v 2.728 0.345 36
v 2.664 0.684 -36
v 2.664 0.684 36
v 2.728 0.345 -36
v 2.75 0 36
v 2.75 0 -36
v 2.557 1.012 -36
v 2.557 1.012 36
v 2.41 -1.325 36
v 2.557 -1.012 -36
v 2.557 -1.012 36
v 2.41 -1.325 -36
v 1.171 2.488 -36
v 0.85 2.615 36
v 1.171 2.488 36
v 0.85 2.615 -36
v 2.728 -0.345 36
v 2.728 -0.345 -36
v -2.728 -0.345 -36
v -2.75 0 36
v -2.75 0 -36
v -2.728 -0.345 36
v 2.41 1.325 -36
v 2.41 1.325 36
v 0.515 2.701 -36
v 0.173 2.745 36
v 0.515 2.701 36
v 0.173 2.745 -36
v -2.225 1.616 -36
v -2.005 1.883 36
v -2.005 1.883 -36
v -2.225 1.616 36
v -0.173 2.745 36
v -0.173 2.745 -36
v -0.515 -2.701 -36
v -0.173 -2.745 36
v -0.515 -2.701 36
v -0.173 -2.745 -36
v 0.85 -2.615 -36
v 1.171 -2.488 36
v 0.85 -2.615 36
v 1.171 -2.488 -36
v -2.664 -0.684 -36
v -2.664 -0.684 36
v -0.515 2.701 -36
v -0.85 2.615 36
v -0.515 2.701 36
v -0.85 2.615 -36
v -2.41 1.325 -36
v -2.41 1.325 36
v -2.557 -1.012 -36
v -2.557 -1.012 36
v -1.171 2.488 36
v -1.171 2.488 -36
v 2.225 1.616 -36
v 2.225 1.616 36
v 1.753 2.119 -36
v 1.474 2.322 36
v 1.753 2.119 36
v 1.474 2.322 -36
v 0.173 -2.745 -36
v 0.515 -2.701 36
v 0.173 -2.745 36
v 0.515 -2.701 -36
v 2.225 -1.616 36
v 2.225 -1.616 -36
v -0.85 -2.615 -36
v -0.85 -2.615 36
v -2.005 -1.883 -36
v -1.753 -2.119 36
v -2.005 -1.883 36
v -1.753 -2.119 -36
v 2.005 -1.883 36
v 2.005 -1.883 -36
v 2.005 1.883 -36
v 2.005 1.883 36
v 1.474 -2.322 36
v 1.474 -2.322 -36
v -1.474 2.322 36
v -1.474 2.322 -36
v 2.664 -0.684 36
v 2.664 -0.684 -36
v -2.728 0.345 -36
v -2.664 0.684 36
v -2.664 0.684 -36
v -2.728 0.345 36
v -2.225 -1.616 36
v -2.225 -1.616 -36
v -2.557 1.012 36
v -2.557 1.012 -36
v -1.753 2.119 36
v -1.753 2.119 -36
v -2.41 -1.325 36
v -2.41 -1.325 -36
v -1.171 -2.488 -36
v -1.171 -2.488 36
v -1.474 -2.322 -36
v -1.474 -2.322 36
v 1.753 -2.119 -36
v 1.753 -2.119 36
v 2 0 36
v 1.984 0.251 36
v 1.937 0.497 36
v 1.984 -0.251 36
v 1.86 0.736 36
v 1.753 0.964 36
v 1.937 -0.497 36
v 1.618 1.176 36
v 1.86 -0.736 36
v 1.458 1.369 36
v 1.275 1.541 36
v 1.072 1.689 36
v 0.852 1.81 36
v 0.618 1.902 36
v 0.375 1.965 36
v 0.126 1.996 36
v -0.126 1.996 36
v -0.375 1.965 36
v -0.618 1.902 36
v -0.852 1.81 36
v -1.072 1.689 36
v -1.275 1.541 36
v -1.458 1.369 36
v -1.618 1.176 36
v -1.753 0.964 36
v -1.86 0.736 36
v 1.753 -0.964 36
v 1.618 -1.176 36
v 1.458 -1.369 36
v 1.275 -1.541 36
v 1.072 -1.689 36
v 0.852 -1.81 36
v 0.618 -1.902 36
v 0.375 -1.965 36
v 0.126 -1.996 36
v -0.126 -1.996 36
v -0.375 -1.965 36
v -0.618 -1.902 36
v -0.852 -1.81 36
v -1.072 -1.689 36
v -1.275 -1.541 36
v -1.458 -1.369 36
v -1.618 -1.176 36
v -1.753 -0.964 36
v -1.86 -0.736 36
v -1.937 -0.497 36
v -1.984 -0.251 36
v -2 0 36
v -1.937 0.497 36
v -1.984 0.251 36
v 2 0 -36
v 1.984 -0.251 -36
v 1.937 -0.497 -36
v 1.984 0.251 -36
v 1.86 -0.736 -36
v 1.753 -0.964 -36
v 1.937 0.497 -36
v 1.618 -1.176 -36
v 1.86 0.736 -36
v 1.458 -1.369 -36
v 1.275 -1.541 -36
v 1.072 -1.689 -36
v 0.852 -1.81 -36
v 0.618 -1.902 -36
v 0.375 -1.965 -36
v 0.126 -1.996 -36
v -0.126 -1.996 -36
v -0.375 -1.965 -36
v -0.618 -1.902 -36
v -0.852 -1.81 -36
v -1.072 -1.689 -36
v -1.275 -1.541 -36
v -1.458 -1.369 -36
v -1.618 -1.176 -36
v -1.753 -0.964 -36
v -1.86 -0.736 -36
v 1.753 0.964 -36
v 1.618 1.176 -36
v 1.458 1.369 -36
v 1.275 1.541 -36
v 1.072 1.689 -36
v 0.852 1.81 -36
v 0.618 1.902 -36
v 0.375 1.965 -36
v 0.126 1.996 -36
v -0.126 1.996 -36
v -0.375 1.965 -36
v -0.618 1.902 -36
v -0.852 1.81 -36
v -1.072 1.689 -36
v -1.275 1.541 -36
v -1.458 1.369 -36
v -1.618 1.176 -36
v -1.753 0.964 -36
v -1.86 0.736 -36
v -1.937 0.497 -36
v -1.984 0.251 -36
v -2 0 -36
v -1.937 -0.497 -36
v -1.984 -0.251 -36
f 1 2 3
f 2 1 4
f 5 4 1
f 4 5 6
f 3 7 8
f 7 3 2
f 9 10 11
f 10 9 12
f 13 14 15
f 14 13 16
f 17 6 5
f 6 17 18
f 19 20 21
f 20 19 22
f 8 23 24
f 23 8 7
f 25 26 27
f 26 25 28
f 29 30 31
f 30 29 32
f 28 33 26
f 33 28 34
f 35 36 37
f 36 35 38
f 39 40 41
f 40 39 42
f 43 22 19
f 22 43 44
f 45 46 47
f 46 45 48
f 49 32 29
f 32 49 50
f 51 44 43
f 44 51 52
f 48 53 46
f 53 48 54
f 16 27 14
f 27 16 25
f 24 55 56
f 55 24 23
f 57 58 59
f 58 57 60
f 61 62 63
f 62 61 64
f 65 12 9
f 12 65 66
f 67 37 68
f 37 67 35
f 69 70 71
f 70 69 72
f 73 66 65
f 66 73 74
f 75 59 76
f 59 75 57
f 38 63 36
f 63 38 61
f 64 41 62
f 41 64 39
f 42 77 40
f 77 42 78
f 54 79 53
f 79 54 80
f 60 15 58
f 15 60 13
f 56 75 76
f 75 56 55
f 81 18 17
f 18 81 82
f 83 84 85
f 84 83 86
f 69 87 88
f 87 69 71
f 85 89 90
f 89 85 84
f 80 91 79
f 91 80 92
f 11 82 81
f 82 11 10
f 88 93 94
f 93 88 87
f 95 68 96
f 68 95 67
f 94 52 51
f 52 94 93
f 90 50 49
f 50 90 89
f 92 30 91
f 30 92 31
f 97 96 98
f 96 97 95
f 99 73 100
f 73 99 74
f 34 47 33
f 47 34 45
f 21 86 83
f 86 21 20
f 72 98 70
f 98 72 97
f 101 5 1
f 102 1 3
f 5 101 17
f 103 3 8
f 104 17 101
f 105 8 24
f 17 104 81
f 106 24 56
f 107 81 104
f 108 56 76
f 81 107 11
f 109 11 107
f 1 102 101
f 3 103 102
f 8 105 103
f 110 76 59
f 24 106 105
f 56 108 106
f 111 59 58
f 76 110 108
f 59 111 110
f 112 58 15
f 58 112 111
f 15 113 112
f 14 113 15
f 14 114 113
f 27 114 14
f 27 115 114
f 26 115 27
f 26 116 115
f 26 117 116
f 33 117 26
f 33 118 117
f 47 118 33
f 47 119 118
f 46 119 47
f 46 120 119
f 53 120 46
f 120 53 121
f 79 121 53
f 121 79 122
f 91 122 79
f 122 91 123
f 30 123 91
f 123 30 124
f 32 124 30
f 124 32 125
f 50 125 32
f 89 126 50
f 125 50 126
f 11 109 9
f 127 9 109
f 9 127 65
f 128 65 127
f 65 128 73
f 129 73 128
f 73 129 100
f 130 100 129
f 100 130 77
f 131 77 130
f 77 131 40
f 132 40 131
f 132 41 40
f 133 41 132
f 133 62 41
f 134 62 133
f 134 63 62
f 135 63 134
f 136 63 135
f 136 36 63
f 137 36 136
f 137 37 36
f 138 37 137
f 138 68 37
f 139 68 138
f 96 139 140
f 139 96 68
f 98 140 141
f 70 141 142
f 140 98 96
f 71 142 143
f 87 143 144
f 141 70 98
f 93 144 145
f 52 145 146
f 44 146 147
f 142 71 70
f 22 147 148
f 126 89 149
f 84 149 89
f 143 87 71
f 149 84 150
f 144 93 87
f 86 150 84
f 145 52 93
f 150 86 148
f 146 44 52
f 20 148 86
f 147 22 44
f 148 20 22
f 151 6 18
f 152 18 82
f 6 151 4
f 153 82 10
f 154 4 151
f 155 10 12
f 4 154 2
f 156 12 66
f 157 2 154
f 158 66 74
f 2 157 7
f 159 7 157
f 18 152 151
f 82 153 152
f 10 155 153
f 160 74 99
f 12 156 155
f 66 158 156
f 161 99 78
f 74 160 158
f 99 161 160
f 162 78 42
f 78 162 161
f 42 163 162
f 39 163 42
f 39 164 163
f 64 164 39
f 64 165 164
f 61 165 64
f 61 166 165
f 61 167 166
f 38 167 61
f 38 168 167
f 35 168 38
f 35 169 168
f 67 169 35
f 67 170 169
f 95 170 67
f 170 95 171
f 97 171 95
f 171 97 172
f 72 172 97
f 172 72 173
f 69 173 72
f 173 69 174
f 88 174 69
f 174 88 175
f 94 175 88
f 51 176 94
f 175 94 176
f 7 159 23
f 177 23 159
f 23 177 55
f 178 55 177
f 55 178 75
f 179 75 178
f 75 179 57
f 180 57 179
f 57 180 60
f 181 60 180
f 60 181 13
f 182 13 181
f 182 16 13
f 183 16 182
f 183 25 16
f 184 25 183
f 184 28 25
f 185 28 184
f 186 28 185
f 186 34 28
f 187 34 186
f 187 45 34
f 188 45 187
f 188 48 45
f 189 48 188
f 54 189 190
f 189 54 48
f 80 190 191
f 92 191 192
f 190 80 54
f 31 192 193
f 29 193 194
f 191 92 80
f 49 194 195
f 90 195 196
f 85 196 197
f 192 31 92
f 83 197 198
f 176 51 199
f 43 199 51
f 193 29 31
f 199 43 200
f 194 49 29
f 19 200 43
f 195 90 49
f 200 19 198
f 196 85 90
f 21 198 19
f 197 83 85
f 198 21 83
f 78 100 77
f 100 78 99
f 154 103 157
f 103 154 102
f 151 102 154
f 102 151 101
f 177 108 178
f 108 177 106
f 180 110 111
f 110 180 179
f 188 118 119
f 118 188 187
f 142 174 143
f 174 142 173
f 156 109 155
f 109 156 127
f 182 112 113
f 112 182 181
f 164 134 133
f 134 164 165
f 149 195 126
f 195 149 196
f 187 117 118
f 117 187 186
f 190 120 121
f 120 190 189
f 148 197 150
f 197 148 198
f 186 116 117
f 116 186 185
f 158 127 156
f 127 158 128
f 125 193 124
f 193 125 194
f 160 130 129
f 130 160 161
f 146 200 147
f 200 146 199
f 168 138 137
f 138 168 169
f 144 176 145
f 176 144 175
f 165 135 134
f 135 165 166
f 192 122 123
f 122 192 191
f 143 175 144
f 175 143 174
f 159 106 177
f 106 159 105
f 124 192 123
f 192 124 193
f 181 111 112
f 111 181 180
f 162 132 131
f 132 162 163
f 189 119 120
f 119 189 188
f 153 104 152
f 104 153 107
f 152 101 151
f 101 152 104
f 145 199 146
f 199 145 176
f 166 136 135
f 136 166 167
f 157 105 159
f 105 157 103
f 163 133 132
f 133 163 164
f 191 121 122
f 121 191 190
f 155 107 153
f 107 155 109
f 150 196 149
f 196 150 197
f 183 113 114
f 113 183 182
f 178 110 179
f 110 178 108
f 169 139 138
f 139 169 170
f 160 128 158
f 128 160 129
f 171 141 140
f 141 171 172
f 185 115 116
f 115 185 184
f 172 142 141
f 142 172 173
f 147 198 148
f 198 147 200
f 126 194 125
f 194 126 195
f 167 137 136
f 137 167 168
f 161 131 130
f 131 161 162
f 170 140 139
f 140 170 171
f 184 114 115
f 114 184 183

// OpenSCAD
$fn = 50;


difference() {
	union() {
		translate(v = [0, 0, -36.0000000000]) {
			cylinder(h = 72, r = 2.7500000000);
		}
	}
	union() {
		translate(v = [0, 0, -100.0000000000]) {
			cylinder(h = 200, r = 2.0000000000);
		}
	}
}
